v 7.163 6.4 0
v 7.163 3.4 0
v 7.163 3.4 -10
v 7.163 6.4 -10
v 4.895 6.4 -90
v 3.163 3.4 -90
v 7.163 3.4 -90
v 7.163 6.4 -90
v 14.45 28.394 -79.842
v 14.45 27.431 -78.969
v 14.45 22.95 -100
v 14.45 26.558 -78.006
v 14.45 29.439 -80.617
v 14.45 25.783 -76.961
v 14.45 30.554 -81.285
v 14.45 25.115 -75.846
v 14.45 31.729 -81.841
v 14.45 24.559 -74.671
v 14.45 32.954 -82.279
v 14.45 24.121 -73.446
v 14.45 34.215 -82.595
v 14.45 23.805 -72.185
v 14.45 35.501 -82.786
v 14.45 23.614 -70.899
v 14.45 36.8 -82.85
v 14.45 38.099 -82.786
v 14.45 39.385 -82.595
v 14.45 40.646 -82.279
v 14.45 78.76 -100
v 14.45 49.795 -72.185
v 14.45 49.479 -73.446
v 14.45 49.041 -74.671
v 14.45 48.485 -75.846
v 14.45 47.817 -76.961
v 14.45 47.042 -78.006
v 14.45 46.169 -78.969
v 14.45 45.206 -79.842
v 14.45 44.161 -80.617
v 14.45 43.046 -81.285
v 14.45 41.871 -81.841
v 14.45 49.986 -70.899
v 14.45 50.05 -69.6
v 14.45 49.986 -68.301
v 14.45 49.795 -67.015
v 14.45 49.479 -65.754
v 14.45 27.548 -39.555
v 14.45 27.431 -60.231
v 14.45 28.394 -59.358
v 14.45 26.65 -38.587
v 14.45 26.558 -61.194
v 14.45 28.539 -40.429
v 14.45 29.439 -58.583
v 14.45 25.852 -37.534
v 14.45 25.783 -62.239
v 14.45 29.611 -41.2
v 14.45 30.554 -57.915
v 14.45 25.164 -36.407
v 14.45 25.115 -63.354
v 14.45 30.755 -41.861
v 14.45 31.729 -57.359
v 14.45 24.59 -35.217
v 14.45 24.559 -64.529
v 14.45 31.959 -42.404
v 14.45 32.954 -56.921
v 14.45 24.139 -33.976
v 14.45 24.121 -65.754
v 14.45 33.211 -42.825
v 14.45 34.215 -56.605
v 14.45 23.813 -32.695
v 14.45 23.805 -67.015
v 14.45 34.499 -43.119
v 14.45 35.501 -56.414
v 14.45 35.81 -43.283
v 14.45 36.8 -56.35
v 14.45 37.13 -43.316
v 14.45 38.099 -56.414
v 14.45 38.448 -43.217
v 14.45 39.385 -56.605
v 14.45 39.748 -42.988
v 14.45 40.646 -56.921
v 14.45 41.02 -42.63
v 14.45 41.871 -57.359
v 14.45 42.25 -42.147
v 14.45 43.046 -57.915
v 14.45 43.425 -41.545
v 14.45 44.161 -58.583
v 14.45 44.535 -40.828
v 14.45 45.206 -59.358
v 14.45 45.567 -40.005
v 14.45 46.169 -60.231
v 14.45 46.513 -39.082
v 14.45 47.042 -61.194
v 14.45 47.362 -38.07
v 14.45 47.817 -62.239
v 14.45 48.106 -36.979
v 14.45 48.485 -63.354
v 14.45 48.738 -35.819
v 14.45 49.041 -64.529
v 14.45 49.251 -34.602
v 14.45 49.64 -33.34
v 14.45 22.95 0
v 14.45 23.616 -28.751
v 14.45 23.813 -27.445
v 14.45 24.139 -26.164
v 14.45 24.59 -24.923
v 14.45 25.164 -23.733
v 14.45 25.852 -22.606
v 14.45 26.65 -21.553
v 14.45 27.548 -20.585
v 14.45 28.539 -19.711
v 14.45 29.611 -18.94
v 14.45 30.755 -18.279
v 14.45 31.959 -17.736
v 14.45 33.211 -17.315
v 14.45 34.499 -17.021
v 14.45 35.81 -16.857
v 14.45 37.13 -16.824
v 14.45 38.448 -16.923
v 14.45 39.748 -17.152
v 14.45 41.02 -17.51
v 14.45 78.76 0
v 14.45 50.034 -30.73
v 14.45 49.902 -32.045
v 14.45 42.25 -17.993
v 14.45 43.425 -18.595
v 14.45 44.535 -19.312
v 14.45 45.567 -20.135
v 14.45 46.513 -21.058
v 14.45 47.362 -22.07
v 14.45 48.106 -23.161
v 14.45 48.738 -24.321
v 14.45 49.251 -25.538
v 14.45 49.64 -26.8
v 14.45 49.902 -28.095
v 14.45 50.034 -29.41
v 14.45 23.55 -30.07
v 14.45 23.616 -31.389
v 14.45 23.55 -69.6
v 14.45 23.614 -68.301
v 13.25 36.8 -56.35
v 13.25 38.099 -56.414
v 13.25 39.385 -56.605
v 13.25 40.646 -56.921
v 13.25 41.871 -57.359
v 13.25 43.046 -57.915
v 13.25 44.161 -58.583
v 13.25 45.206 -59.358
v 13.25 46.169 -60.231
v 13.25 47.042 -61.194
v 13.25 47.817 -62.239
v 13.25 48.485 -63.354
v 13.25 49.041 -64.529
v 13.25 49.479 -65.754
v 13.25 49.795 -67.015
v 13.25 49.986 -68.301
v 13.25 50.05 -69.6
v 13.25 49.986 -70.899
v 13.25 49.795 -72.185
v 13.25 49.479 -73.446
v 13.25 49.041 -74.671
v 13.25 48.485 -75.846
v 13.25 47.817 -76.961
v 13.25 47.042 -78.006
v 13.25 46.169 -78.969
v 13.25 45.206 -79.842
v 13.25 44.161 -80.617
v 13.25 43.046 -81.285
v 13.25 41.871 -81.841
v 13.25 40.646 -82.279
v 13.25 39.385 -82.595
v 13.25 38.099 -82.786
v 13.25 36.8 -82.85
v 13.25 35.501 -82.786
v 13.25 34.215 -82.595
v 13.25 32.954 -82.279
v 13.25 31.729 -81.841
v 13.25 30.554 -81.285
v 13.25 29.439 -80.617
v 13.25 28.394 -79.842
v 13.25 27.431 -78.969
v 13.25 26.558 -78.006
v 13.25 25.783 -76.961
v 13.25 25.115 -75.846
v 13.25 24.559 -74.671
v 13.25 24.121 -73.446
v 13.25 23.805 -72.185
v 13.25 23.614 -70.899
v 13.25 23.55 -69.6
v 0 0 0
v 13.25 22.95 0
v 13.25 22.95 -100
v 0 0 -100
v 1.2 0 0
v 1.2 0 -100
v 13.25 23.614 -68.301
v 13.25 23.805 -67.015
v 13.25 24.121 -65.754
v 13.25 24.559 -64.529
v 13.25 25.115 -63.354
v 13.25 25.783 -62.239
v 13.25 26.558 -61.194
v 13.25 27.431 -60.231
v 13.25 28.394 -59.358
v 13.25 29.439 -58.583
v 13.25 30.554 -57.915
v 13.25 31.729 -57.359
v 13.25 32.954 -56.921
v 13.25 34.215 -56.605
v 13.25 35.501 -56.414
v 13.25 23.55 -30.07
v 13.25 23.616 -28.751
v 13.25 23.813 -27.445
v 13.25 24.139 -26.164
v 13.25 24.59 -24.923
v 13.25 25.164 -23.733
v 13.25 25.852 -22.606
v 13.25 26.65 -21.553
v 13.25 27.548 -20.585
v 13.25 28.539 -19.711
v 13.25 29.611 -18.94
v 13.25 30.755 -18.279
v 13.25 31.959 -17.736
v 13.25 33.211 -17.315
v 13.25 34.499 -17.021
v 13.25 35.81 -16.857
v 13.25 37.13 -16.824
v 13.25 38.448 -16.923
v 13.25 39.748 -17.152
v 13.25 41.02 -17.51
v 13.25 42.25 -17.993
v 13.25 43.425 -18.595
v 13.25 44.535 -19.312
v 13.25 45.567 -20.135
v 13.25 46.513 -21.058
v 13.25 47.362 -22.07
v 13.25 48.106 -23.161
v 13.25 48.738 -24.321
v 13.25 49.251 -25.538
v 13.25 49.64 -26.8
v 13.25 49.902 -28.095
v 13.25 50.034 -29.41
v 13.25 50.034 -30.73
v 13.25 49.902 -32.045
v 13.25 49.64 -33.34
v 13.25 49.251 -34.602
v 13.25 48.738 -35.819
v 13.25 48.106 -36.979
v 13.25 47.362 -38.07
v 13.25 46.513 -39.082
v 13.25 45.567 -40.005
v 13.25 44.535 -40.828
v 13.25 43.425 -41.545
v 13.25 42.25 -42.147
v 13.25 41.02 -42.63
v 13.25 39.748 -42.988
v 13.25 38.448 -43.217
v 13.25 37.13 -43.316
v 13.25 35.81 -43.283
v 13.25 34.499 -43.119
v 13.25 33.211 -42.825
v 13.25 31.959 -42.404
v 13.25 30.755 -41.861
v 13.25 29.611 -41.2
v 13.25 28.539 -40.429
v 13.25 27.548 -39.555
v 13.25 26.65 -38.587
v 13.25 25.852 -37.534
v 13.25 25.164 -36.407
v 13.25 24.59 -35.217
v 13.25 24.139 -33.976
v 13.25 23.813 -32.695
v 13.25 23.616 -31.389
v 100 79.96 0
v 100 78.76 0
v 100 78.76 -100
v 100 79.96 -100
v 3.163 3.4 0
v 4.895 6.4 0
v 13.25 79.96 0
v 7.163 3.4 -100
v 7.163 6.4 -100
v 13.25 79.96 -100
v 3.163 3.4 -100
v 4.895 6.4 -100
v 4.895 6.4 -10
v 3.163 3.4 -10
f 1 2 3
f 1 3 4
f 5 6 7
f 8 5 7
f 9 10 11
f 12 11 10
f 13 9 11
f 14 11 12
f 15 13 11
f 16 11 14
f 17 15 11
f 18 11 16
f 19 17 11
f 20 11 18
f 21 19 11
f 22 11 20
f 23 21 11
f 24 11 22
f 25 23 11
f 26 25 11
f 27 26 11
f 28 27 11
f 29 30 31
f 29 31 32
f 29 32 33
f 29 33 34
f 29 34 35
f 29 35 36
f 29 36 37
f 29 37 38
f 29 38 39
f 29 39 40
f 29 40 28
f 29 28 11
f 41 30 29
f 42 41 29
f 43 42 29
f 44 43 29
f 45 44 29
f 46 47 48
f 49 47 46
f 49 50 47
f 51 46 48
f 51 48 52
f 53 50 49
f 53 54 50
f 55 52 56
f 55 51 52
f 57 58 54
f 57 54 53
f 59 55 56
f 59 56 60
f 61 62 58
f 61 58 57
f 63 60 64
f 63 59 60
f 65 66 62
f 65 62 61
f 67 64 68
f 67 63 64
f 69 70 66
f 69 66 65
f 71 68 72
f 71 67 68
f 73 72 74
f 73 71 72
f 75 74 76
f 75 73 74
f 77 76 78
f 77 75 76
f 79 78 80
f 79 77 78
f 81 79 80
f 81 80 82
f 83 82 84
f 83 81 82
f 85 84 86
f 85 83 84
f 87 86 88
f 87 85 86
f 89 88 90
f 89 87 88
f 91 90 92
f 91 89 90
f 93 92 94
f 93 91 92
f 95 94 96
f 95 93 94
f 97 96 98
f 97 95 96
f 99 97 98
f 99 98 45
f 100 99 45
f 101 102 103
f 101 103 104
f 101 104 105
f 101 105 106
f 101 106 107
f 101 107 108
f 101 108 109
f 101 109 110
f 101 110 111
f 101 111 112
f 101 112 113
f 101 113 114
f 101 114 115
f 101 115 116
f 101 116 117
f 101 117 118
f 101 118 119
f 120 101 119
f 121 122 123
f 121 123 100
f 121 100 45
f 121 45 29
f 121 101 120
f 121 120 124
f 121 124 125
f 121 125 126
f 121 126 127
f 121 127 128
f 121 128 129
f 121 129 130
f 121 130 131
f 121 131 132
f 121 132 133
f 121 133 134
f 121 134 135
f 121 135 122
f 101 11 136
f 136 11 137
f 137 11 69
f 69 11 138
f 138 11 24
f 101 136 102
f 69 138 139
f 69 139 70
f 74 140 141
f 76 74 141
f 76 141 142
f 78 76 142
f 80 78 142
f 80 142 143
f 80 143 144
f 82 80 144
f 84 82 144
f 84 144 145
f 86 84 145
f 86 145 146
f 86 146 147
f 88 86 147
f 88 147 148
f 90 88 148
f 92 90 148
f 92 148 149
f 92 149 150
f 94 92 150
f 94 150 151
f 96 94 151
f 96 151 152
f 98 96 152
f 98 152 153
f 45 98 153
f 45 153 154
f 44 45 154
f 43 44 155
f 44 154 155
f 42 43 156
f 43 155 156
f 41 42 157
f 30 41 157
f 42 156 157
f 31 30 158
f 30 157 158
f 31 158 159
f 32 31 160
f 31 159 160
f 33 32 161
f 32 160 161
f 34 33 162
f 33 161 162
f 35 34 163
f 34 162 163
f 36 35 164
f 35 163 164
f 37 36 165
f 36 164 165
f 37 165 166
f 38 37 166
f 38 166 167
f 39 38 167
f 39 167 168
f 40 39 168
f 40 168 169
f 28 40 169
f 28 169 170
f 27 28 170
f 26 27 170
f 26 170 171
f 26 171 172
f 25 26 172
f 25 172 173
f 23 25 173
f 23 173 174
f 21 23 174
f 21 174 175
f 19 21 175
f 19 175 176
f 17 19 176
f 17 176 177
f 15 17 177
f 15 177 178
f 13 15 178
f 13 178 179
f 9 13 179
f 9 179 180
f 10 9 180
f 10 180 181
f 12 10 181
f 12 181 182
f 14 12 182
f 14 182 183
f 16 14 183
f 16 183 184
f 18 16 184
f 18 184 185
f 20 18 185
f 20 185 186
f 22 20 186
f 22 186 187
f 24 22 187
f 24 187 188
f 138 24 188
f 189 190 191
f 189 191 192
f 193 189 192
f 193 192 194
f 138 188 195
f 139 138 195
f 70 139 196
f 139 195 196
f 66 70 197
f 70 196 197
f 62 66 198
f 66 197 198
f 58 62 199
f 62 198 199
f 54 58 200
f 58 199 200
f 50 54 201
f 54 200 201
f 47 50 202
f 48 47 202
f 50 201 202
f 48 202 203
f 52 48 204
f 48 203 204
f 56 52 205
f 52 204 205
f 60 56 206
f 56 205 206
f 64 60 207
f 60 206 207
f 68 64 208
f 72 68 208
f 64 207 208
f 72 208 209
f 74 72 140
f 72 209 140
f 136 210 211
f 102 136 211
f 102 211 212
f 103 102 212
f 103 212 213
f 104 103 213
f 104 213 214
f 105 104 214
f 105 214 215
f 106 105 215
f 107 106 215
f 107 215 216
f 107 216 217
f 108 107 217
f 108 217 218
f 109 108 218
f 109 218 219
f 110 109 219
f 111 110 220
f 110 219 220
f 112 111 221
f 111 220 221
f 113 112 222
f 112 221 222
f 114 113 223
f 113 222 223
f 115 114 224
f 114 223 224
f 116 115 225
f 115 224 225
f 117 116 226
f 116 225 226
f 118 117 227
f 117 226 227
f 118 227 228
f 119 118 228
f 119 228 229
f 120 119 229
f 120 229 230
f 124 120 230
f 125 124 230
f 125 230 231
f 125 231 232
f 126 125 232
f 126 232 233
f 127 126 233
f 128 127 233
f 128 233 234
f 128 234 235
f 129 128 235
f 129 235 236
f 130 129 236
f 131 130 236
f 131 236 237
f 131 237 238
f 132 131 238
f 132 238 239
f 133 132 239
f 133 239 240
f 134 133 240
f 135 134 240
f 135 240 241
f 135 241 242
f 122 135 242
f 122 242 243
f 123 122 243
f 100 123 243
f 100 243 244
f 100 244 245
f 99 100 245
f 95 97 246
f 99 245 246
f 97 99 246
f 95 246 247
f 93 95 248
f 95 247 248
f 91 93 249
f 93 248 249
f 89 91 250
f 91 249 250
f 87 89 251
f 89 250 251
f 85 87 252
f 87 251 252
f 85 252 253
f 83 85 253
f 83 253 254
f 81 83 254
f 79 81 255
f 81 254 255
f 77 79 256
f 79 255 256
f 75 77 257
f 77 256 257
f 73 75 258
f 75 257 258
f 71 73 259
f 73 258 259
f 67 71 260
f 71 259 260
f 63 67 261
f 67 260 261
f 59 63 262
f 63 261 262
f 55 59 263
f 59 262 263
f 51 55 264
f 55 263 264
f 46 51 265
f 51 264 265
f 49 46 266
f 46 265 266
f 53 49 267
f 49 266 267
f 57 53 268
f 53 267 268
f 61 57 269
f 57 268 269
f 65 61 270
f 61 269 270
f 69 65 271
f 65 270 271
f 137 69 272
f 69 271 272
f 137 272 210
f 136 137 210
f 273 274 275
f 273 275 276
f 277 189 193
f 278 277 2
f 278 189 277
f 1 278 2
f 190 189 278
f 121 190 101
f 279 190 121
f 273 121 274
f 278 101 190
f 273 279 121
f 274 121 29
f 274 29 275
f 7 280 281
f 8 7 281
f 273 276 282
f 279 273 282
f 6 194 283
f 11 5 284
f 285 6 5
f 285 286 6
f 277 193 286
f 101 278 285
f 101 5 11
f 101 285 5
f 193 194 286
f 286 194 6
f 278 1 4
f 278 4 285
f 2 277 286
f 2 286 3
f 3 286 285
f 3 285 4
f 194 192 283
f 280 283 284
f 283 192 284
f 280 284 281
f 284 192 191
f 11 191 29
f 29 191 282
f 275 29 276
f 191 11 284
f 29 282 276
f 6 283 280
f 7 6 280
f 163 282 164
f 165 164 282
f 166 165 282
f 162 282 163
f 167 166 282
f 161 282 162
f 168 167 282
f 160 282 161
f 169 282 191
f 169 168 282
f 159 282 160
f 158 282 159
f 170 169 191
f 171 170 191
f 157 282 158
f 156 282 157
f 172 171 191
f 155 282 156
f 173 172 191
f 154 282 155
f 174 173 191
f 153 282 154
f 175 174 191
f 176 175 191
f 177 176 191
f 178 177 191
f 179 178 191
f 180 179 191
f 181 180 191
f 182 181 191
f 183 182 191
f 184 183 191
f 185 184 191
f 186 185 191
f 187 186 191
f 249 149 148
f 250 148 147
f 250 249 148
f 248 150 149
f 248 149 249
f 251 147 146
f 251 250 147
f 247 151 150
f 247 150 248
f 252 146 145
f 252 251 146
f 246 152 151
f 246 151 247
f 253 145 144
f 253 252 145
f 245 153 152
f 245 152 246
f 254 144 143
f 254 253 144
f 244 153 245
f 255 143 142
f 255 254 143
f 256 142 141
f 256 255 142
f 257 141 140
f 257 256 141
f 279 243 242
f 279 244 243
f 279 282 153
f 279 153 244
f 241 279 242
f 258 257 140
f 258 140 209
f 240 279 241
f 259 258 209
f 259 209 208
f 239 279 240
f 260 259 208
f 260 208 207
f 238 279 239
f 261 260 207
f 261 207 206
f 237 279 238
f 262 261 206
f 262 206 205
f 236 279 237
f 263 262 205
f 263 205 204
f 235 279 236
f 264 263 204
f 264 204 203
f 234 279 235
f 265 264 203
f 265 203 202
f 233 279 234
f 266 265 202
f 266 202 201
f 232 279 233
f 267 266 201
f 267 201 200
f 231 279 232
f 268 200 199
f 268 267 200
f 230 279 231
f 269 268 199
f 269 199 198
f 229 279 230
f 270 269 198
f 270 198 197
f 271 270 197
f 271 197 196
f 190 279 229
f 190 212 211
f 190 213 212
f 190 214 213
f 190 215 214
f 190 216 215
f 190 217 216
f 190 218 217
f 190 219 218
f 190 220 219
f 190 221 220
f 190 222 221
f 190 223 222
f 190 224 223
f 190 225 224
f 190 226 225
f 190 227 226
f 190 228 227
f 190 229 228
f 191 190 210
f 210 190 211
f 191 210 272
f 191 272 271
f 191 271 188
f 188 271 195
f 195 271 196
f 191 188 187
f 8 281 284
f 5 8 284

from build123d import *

# Parameters (mm, degrees)
SALIENTE_EXTRUIR1_DEPTH = 100
SALIENTE_EXTRUIR2_DEPTH = 10
SALIENTE_EXTRUIR3_DEPTH = 10
CROQUIS9_R              = 13.25
CORTAR_EXTRUIR5_DEPTH   = 10


with BuildPart() as part:
    # Croquis1 → Saliente-Extruir1 (new body)
    with BuildSketch(Plane.XY):
        Polygon((0, 0), (1.2, 0), (14.45, 22.9496732), (14.45, 78.7596732), (100, 78.7596732), (100, 79.9596732), (13.25, 79.9596732), (13.25, 22.9496732), align=None)
    extrude(amount=-SALIENTE_EXTRUIR1_DEPTH)

    # Croquis2 → Saliente-Extruir2 (add)
    with BuildSketch(Plane.XY):
        Polygon((3.162990915, 3.4), (7.162990915, 3.4), (7.162990915, 6.4), (4.895041723, 6.4), align=None)
    extrude(amount=-SALIENTE_EXTRUIR2_DEPTH)

    # Croquis4 → Saliente-Extruir3 (add)
    with BuildSketch(Plane(origin=(0, 0, -100), x_dir=(-1, 0, 0), z_dir=(0, 0, -1))):
        Polygon((-3.162990915, 3.4), (-7.162990915, 3.4), (-7.162990915, 6.4), (-4.895041723, 6.4), align=None)
    extrude(amount=-SALIENTE_EXTRUIR3_DEPTH)

    # Croquis9 → Cortar-Extruir5 (cut)
    with BuildSketch(Plane.ZY.offset(-13.25)):
        with BuildLine():
            ThreePointArc((-56.35, 36.8), (-78.969164851, 46.169164851), (-69.6, 23.55))
            Line((-69.6, 23.55), (-69.6, 36.8))
            Line((-69.6, 36.8), (-56.35, 36.8))
        make_face()
        with BuildLine():
            Line((-69.6, 36.8), (-69.6, 23.55))
            ThreePointArc((-69.6, 23.55), (-60.230835149, 27.430835149), (-56.35, 36.8))
            Line((-56.35, 36.8), (-69.6, 36.8))
        make_face()
        with Locations(Location((-30.07, 36.8, 0), (0, 0, 270))):
            Circle(CROQUIS9_R)
    extrude(amount=-CORTAR_EXTRUIR5_DEPTH, mode=Mode.SUBTRACT)


solid = part.part
